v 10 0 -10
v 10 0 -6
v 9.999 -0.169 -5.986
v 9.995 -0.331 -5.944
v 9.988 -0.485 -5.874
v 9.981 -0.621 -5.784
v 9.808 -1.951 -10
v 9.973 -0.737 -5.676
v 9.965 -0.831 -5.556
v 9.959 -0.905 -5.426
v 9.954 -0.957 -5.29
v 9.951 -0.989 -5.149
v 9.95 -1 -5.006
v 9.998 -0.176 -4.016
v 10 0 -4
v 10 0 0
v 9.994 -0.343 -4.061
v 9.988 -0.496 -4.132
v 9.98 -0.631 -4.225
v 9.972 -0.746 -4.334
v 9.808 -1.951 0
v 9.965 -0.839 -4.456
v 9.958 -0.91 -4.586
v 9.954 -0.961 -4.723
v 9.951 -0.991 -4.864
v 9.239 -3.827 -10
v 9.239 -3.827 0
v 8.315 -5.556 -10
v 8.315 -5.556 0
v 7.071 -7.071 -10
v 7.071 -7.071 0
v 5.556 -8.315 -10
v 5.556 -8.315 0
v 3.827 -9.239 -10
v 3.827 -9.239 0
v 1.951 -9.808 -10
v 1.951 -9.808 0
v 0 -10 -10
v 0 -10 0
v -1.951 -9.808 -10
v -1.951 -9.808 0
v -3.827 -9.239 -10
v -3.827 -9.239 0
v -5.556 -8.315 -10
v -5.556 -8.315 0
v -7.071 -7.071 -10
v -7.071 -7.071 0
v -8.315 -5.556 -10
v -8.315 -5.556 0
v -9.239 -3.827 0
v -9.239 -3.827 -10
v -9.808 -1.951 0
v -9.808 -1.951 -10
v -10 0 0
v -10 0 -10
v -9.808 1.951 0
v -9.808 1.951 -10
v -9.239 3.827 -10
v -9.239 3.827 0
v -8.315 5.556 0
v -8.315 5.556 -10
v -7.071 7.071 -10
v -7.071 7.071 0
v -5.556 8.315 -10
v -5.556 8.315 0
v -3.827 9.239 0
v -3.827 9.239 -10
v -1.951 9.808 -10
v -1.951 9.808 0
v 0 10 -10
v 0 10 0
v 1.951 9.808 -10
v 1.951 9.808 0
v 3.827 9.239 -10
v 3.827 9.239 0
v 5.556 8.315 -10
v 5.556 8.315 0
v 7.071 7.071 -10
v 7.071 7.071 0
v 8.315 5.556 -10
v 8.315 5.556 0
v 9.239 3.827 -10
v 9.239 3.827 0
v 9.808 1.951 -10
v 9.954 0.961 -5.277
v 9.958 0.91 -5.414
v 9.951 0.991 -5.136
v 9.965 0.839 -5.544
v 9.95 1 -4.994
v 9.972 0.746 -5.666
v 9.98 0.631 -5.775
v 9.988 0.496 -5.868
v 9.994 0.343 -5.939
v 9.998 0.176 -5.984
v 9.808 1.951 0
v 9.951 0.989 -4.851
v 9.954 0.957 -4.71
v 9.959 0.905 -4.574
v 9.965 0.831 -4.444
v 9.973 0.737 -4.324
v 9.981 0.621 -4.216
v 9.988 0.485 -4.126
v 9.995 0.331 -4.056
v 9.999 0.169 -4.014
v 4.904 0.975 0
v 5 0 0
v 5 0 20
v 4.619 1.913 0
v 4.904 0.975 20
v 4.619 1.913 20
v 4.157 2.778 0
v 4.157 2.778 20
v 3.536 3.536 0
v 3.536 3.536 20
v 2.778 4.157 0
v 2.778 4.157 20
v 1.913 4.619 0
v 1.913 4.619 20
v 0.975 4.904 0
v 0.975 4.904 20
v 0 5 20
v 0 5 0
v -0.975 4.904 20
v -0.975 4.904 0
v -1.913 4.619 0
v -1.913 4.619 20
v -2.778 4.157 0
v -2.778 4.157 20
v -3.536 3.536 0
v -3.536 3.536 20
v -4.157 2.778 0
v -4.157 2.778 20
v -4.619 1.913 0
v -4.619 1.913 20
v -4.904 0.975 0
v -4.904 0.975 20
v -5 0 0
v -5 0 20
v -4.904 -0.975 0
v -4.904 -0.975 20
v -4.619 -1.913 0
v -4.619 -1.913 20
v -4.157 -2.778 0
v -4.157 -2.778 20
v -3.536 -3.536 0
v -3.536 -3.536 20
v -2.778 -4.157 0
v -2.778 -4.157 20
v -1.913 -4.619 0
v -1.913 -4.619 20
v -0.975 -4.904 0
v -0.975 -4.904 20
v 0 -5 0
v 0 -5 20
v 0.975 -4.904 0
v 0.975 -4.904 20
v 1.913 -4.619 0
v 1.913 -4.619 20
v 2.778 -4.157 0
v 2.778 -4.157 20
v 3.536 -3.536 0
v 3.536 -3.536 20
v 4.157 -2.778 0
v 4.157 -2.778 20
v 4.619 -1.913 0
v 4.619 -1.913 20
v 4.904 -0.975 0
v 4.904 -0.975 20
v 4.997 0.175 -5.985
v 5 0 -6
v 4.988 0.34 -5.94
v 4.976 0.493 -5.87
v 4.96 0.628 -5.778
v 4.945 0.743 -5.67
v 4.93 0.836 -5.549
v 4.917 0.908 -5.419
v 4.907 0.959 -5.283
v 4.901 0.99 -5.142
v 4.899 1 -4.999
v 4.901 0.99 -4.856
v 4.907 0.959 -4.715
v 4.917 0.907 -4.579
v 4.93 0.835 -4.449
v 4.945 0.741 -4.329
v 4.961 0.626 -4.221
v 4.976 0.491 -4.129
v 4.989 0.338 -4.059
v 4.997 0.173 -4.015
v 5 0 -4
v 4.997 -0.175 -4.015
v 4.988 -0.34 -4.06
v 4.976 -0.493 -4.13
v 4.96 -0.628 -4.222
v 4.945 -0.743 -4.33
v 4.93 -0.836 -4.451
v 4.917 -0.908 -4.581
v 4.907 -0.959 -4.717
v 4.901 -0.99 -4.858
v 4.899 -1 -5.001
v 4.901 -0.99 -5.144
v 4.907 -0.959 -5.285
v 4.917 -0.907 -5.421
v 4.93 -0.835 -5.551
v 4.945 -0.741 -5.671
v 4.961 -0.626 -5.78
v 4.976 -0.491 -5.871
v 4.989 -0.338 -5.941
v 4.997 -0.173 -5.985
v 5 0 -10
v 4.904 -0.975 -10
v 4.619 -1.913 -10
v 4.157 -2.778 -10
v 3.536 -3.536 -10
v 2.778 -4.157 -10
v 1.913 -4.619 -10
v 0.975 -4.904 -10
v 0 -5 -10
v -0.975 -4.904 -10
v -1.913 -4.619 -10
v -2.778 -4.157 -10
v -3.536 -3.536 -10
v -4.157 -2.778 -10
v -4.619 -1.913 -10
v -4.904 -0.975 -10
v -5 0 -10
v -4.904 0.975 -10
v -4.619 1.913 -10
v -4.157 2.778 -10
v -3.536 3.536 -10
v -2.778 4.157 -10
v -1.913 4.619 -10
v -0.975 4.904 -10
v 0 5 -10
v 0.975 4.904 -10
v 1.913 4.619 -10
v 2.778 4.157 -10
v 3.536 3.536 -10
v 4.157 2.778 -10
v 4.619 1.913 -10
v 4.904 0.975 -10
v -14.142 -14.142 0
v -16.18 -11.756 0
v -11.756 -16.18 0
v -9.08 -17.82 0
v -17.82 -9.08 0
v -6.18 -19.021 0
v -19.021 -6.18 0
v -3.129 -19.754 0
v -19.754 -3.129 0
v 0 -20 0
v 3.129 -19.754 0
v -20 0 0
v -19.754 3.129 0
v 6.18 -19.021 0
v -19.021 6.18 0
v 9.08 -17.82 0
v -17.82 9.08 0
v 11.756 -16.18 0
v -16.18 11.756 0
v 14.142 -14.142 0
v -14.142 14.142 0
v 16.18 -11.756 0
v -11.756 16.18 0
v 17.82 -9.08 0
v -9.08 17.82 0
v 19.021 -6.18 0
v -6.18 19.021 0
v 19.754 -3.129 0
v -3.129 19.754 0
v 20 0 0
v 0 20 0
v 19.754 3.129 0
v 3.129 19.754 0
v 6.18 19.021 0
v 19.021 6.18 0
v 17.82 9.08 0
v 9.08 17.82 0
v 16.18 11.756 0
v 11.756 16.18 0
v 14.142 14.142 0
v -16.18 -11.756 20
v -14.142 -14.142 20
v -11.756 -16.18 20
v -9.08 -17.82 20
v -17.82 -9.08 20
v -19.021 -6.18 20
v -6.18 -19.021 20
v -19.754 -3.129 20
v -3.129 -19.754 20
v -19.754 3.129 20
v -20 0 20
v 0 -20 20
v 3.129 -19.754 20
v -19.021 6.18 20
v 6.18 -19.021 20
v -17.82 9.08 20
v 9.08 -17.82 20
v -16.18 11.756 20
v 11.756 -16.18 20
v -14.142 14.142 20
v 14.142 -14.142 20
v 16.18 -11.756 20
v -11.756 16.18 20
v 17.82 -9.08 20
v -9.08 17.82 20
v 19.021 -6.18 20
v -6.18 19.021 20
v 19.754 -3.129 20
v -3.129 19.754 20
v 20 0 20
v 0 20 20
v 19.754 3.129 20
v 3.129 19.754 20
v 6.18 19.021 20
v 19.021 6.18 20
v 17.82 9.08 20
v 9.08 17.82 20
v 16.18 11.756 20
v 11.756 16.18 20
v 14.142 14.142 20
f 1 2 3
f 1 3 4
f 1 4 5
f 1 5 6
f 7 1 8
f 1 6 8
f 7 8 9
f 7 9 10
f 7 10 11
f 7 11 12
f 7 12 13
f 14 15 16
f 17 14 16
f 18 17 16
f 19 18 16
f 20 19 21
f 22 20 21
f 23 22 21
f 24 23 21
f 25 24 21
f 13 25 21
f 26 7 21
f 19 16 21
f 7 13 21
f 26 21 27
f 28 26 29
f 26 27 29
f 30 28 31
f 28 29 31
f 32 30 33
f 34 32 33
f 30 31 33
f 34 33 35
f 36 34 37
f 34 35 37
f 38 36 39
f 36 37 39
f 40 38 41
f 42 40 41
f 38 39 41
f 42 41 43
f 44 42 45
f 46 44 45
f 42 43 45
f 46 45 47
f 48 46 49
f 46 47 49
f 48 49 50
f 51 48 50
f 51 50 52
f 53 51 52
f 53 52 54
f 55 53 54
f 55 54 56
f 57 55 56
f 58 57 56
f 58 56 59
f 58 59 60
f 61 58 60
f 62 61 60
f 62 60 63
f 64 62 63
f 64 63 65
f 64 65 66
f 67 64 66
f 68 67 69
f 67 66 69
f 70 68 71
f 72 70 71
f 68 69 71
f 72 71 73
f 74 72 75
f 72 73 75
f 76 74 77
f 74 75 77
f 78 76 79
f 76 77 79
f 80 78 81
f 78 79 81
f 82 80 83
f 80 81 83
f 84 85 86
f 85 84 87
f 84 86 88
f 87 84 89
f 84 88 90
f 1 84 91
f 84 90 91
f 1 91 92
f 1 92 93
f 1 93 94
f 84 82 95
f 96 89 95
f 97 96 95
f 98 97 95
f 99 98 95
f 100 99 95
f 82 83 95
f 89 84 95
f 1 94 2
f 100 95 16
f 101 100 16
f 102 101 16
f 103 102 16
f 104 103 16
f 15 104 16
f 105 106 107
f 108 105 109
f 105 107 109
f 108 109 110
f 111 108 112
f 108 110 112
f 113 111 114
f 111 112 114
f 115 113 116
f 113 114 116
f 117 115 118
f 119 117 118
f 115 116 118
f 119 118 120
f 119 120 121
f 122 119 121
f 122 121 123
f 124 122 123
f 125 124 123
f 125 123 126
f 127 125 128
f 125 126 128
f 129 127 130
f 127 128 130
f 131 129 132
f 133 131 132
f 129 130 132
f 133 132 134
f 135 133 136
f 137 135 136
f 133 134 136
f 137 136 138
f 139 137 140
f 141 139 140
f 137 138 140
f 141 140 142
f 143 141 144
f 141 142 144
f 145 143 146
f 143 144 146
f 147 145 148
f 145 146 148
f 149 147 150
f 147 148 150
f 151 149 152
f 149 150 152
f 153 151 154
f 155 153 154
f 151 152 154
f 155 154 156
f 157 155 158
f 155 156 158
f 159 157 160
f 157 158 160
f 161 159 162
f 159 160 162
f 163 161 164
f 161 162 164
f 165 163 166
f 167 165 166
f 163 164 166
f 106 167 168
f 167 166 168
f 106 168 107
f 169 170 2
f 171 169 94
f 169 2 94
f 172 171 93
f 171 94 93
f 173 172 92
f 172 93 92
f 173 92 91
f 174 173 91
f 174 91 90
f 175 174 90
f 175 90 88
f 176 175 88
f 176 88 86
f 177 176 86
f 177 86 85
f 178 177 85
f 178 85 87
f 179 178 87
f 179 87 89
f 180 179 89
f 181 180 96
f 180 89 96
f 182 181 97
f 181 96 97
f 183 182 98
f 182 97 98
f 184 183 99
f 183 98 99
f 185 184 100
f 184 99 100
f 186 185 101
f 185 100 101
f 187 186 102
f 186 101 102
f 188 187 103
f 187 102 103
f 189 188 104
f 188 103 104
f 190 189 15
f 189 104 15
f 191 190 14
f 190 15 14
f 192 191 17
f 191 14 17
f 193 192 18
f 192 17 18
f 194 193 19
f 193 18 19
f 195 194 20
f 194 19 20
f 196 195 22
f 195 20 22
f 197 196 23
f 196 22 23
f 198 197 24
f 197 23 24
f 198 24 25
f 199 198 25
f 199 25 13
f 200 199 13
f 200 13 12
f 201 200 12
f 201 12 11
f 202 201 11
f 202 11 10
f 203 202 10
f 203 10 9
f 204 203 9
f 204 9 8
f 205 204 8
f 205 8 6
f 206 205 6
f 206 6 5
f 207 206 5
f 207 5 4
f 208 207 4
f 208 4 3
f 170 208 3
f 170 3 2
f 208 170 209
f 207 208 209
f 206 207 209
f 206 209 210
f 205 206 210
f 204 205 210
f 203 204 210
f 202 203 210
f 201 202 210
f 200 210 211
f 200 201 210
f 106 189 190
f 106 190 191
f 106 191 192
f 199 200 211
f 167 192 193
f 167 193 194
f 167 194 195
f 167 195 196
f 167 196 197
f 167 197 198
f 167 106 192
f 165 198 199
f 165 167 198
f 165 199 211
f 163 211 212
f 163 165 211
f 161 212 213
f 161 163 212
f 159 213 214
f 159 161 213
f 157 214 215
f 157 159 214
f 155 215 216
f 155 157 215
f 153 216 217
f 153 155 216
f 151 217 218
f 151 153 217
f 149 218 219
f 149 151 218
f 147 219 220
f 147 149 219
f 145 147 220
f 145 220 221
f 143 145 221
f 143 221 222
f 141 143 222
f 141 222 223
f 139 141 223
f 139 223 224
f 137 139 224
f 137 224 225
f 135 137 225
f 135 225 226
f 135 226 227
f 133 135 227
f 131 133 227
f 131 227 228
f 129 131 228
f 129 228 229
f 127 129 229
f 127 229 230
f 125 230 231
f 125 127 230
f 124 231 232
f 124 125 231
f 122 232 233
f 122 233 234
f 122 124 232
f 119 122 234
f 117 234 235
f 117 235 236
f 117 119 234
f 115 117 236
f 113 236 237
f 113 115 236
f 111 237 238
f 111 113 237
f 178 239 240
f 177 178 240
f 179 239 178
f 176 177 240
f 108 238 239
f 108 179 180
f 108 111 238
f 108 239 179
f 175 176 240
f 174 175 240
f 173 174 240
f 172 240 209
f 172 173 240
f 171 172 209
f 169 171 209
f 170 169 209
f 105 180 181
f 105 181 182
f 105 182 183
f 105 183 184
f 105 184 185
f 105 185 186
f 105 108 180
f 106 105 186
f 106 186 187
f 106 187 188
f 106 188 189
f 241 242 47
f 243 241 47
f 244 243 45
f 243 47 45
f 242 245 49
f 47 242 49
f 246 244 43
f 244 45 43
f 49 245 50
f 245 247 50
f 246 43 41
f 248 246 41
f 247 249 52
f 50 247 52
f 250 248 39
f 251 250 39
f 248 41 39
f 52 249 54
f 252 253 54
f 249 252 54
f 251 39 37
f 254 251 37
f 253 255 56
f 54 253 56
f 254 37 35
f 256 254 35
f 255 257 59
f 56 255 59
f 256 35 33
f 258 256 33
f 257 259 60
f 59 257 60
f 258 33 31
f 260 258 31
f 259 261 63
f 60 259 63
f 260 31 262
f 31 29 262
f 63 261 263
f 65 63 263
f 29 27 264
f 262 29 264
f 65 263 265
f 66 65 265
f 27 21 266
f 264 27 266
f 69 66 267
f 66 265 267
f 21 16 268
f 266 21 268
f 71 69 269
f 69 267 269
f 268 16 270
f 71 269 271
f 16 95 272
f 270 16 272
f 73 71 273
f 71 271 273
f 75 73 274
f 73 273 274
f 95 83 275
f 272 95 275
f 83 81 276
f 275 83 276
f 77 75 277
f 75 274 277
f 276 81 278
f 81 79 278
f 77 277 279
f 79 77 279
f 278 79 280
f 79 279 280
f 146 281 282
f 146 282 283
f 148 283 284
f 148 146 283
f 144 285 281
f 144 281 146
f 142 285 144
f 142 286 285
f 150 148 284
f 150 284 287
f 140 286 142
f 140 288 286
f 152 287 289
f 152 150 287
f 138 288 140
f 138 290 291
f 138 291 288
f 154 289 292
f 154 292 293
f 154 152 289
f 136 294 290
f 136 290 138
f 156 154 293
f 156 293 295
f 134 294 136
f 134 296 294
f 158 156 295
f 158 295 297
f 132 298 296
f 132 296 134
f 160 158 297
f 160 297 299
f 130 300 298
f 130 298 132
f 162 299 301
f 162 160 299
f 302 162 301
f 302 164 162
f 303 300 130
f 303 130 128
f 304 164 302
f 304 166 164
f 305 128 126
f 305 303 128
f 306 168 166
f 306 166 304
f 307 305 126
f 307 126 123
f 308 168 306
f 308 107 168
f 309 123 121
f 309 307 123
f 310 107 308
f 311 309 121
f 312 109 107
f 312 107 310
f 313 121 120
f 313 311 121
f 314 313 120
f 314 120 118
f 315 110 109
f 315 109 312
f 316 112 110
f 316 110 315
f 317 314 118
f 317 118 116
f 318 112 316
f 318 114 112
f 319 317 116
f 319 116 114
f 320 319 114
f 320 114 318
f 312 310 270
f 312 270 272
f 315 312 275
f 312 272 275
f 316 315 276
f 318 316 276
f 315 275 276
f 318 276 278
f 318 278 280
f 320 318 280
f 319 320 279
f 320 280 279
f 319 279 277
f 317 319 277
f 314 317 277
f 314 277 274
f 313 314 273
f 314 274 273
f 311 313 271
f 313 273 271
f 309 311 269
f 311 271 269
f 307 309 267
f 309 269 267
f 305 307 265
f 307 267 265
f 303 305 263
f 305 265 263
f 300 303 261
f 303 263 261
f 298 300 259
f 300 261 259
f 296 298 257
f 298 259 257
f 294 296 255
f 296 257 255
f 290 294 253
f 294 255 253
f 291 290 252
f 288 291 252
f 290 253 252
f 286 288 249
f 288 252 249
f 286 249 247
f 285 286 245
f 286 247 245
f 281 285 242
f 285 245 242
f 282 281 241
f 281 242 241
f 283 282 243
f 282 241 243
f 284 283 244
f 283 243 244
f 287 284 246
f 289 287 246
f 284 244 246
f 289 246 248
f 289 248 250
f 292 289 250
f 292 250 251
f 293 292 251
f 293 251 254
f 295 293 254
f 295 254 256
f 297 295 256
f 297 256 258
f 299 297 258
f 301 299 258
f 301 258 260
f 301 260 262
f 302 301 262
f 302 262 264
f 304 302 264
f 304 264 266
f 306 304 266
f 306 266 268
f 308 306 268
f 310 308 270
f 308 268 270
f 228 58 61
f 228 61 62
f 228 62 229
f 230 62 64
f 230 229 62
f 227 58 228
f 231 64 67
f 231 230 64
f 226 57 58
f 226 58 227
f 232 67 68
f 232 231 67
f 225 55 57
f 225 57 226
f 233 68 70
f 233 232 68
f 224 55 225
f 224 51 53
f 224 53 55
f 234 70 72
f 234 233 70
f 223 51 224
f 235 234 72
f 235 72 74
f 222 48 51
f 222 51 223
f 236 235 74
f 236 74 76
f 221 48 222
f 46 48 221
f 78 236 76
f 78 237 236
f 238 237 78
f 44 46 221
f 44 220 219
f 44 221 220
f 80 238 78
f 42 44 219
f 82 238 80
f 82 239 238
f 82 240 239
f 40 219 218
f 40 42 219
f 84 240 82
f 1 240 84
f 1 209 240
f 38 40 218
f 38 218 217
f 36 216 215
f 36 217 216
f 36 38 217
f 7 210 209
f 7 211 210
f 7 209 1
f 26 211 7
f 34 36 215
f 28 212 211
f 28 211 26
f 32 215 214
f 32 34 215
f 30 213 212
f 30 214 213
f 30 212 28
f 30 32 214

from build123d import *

# Parameters (mm, degrees)
SKETCH1_R               = 20
BOSS_EXTRUDE1_DEPTH     = 20
SKETCH2_R               = 5
CUT_EXTRUDE1_DEPTH      = 20
SKETCH3_R               = 10
SKETCH3_R_2             = 5
BOSS_EXTRUDE2_DEPTH     = 10
CUT_EXTRUDE2_REACH      = 43.231
CUT_EXTRUDE2_END_RADIUS = 5
SKETCH5_R               = 1


with BuildPart() as part:
    # Sketch1 → Boss-Extrude1 (new body)
    with BuildSketch(Plane.XY):
        Circle(SKETCH1_R)
    extrude(amount=BOSS_EXTRUDE1_DEPTH)

    # Sketch2 → Cut-Extrude1 (cut)
    with BuildSketch(Plane.XY.offset(20)):
        Circle(SKETCH2_R)
    extrude(amount=-CUT_EXTRUDE1_DEPTH, mode=Mode.SUBTRACT)

    # Sketch3 → Boss-Extrude2 (add)
    with BuildSketch(Plane(origin=(0, 0, 0), x_dir=(-1, 0, 0), z_dir=(0, 0, -1))):
        with Locations(Location((0, 0, 0), (0, 0, 180))):
            Circle(SKETCH3_R)
        with Locations(Location((0, 0, 0), (0, 0, 180))):
            Circle(SKETCH3_R_2, mode=Mode.SUBTRACT)
    extrude(amount=BOSS_EXTRUDE2_DEPTH)

    # Cut-Extrude2: up to this cylinder (the profile starts outside it)
    cut_extrude2_end = Plane(origin=(0, 0, -5), z_dir=(0, 0, 1)) * Cylinder(CUT_EXTRUDE2_END_RADIUS, 97.462, mode=Mode.PRIVATE)
    # Sketch5 → Cut-Extrude2 (cut, up to the surface)
    with BuildSketch(Plane(origin=(10, 0, 0), x_dir=(0, 0, -1), z_dir=(1, 0, 0)), mode=Mode.PRIVATE) as cut_extrude2_sk1:
        with Locations((5, 0)):
            Circle(SKETCH5_R)
    cut_extrude2_tool1 = extrude(cut_extrude2_sk1.sketch, amount=-CUT_EXTRUDE2_REACH, mode=Mode.PRIVATE) - cut_extrude2_end
    add(cut_extrude2_tool1.solids().sort_by_distance((10, 0, -5))[0], mode=Mode.SUBTRACT)


solid = part.part
